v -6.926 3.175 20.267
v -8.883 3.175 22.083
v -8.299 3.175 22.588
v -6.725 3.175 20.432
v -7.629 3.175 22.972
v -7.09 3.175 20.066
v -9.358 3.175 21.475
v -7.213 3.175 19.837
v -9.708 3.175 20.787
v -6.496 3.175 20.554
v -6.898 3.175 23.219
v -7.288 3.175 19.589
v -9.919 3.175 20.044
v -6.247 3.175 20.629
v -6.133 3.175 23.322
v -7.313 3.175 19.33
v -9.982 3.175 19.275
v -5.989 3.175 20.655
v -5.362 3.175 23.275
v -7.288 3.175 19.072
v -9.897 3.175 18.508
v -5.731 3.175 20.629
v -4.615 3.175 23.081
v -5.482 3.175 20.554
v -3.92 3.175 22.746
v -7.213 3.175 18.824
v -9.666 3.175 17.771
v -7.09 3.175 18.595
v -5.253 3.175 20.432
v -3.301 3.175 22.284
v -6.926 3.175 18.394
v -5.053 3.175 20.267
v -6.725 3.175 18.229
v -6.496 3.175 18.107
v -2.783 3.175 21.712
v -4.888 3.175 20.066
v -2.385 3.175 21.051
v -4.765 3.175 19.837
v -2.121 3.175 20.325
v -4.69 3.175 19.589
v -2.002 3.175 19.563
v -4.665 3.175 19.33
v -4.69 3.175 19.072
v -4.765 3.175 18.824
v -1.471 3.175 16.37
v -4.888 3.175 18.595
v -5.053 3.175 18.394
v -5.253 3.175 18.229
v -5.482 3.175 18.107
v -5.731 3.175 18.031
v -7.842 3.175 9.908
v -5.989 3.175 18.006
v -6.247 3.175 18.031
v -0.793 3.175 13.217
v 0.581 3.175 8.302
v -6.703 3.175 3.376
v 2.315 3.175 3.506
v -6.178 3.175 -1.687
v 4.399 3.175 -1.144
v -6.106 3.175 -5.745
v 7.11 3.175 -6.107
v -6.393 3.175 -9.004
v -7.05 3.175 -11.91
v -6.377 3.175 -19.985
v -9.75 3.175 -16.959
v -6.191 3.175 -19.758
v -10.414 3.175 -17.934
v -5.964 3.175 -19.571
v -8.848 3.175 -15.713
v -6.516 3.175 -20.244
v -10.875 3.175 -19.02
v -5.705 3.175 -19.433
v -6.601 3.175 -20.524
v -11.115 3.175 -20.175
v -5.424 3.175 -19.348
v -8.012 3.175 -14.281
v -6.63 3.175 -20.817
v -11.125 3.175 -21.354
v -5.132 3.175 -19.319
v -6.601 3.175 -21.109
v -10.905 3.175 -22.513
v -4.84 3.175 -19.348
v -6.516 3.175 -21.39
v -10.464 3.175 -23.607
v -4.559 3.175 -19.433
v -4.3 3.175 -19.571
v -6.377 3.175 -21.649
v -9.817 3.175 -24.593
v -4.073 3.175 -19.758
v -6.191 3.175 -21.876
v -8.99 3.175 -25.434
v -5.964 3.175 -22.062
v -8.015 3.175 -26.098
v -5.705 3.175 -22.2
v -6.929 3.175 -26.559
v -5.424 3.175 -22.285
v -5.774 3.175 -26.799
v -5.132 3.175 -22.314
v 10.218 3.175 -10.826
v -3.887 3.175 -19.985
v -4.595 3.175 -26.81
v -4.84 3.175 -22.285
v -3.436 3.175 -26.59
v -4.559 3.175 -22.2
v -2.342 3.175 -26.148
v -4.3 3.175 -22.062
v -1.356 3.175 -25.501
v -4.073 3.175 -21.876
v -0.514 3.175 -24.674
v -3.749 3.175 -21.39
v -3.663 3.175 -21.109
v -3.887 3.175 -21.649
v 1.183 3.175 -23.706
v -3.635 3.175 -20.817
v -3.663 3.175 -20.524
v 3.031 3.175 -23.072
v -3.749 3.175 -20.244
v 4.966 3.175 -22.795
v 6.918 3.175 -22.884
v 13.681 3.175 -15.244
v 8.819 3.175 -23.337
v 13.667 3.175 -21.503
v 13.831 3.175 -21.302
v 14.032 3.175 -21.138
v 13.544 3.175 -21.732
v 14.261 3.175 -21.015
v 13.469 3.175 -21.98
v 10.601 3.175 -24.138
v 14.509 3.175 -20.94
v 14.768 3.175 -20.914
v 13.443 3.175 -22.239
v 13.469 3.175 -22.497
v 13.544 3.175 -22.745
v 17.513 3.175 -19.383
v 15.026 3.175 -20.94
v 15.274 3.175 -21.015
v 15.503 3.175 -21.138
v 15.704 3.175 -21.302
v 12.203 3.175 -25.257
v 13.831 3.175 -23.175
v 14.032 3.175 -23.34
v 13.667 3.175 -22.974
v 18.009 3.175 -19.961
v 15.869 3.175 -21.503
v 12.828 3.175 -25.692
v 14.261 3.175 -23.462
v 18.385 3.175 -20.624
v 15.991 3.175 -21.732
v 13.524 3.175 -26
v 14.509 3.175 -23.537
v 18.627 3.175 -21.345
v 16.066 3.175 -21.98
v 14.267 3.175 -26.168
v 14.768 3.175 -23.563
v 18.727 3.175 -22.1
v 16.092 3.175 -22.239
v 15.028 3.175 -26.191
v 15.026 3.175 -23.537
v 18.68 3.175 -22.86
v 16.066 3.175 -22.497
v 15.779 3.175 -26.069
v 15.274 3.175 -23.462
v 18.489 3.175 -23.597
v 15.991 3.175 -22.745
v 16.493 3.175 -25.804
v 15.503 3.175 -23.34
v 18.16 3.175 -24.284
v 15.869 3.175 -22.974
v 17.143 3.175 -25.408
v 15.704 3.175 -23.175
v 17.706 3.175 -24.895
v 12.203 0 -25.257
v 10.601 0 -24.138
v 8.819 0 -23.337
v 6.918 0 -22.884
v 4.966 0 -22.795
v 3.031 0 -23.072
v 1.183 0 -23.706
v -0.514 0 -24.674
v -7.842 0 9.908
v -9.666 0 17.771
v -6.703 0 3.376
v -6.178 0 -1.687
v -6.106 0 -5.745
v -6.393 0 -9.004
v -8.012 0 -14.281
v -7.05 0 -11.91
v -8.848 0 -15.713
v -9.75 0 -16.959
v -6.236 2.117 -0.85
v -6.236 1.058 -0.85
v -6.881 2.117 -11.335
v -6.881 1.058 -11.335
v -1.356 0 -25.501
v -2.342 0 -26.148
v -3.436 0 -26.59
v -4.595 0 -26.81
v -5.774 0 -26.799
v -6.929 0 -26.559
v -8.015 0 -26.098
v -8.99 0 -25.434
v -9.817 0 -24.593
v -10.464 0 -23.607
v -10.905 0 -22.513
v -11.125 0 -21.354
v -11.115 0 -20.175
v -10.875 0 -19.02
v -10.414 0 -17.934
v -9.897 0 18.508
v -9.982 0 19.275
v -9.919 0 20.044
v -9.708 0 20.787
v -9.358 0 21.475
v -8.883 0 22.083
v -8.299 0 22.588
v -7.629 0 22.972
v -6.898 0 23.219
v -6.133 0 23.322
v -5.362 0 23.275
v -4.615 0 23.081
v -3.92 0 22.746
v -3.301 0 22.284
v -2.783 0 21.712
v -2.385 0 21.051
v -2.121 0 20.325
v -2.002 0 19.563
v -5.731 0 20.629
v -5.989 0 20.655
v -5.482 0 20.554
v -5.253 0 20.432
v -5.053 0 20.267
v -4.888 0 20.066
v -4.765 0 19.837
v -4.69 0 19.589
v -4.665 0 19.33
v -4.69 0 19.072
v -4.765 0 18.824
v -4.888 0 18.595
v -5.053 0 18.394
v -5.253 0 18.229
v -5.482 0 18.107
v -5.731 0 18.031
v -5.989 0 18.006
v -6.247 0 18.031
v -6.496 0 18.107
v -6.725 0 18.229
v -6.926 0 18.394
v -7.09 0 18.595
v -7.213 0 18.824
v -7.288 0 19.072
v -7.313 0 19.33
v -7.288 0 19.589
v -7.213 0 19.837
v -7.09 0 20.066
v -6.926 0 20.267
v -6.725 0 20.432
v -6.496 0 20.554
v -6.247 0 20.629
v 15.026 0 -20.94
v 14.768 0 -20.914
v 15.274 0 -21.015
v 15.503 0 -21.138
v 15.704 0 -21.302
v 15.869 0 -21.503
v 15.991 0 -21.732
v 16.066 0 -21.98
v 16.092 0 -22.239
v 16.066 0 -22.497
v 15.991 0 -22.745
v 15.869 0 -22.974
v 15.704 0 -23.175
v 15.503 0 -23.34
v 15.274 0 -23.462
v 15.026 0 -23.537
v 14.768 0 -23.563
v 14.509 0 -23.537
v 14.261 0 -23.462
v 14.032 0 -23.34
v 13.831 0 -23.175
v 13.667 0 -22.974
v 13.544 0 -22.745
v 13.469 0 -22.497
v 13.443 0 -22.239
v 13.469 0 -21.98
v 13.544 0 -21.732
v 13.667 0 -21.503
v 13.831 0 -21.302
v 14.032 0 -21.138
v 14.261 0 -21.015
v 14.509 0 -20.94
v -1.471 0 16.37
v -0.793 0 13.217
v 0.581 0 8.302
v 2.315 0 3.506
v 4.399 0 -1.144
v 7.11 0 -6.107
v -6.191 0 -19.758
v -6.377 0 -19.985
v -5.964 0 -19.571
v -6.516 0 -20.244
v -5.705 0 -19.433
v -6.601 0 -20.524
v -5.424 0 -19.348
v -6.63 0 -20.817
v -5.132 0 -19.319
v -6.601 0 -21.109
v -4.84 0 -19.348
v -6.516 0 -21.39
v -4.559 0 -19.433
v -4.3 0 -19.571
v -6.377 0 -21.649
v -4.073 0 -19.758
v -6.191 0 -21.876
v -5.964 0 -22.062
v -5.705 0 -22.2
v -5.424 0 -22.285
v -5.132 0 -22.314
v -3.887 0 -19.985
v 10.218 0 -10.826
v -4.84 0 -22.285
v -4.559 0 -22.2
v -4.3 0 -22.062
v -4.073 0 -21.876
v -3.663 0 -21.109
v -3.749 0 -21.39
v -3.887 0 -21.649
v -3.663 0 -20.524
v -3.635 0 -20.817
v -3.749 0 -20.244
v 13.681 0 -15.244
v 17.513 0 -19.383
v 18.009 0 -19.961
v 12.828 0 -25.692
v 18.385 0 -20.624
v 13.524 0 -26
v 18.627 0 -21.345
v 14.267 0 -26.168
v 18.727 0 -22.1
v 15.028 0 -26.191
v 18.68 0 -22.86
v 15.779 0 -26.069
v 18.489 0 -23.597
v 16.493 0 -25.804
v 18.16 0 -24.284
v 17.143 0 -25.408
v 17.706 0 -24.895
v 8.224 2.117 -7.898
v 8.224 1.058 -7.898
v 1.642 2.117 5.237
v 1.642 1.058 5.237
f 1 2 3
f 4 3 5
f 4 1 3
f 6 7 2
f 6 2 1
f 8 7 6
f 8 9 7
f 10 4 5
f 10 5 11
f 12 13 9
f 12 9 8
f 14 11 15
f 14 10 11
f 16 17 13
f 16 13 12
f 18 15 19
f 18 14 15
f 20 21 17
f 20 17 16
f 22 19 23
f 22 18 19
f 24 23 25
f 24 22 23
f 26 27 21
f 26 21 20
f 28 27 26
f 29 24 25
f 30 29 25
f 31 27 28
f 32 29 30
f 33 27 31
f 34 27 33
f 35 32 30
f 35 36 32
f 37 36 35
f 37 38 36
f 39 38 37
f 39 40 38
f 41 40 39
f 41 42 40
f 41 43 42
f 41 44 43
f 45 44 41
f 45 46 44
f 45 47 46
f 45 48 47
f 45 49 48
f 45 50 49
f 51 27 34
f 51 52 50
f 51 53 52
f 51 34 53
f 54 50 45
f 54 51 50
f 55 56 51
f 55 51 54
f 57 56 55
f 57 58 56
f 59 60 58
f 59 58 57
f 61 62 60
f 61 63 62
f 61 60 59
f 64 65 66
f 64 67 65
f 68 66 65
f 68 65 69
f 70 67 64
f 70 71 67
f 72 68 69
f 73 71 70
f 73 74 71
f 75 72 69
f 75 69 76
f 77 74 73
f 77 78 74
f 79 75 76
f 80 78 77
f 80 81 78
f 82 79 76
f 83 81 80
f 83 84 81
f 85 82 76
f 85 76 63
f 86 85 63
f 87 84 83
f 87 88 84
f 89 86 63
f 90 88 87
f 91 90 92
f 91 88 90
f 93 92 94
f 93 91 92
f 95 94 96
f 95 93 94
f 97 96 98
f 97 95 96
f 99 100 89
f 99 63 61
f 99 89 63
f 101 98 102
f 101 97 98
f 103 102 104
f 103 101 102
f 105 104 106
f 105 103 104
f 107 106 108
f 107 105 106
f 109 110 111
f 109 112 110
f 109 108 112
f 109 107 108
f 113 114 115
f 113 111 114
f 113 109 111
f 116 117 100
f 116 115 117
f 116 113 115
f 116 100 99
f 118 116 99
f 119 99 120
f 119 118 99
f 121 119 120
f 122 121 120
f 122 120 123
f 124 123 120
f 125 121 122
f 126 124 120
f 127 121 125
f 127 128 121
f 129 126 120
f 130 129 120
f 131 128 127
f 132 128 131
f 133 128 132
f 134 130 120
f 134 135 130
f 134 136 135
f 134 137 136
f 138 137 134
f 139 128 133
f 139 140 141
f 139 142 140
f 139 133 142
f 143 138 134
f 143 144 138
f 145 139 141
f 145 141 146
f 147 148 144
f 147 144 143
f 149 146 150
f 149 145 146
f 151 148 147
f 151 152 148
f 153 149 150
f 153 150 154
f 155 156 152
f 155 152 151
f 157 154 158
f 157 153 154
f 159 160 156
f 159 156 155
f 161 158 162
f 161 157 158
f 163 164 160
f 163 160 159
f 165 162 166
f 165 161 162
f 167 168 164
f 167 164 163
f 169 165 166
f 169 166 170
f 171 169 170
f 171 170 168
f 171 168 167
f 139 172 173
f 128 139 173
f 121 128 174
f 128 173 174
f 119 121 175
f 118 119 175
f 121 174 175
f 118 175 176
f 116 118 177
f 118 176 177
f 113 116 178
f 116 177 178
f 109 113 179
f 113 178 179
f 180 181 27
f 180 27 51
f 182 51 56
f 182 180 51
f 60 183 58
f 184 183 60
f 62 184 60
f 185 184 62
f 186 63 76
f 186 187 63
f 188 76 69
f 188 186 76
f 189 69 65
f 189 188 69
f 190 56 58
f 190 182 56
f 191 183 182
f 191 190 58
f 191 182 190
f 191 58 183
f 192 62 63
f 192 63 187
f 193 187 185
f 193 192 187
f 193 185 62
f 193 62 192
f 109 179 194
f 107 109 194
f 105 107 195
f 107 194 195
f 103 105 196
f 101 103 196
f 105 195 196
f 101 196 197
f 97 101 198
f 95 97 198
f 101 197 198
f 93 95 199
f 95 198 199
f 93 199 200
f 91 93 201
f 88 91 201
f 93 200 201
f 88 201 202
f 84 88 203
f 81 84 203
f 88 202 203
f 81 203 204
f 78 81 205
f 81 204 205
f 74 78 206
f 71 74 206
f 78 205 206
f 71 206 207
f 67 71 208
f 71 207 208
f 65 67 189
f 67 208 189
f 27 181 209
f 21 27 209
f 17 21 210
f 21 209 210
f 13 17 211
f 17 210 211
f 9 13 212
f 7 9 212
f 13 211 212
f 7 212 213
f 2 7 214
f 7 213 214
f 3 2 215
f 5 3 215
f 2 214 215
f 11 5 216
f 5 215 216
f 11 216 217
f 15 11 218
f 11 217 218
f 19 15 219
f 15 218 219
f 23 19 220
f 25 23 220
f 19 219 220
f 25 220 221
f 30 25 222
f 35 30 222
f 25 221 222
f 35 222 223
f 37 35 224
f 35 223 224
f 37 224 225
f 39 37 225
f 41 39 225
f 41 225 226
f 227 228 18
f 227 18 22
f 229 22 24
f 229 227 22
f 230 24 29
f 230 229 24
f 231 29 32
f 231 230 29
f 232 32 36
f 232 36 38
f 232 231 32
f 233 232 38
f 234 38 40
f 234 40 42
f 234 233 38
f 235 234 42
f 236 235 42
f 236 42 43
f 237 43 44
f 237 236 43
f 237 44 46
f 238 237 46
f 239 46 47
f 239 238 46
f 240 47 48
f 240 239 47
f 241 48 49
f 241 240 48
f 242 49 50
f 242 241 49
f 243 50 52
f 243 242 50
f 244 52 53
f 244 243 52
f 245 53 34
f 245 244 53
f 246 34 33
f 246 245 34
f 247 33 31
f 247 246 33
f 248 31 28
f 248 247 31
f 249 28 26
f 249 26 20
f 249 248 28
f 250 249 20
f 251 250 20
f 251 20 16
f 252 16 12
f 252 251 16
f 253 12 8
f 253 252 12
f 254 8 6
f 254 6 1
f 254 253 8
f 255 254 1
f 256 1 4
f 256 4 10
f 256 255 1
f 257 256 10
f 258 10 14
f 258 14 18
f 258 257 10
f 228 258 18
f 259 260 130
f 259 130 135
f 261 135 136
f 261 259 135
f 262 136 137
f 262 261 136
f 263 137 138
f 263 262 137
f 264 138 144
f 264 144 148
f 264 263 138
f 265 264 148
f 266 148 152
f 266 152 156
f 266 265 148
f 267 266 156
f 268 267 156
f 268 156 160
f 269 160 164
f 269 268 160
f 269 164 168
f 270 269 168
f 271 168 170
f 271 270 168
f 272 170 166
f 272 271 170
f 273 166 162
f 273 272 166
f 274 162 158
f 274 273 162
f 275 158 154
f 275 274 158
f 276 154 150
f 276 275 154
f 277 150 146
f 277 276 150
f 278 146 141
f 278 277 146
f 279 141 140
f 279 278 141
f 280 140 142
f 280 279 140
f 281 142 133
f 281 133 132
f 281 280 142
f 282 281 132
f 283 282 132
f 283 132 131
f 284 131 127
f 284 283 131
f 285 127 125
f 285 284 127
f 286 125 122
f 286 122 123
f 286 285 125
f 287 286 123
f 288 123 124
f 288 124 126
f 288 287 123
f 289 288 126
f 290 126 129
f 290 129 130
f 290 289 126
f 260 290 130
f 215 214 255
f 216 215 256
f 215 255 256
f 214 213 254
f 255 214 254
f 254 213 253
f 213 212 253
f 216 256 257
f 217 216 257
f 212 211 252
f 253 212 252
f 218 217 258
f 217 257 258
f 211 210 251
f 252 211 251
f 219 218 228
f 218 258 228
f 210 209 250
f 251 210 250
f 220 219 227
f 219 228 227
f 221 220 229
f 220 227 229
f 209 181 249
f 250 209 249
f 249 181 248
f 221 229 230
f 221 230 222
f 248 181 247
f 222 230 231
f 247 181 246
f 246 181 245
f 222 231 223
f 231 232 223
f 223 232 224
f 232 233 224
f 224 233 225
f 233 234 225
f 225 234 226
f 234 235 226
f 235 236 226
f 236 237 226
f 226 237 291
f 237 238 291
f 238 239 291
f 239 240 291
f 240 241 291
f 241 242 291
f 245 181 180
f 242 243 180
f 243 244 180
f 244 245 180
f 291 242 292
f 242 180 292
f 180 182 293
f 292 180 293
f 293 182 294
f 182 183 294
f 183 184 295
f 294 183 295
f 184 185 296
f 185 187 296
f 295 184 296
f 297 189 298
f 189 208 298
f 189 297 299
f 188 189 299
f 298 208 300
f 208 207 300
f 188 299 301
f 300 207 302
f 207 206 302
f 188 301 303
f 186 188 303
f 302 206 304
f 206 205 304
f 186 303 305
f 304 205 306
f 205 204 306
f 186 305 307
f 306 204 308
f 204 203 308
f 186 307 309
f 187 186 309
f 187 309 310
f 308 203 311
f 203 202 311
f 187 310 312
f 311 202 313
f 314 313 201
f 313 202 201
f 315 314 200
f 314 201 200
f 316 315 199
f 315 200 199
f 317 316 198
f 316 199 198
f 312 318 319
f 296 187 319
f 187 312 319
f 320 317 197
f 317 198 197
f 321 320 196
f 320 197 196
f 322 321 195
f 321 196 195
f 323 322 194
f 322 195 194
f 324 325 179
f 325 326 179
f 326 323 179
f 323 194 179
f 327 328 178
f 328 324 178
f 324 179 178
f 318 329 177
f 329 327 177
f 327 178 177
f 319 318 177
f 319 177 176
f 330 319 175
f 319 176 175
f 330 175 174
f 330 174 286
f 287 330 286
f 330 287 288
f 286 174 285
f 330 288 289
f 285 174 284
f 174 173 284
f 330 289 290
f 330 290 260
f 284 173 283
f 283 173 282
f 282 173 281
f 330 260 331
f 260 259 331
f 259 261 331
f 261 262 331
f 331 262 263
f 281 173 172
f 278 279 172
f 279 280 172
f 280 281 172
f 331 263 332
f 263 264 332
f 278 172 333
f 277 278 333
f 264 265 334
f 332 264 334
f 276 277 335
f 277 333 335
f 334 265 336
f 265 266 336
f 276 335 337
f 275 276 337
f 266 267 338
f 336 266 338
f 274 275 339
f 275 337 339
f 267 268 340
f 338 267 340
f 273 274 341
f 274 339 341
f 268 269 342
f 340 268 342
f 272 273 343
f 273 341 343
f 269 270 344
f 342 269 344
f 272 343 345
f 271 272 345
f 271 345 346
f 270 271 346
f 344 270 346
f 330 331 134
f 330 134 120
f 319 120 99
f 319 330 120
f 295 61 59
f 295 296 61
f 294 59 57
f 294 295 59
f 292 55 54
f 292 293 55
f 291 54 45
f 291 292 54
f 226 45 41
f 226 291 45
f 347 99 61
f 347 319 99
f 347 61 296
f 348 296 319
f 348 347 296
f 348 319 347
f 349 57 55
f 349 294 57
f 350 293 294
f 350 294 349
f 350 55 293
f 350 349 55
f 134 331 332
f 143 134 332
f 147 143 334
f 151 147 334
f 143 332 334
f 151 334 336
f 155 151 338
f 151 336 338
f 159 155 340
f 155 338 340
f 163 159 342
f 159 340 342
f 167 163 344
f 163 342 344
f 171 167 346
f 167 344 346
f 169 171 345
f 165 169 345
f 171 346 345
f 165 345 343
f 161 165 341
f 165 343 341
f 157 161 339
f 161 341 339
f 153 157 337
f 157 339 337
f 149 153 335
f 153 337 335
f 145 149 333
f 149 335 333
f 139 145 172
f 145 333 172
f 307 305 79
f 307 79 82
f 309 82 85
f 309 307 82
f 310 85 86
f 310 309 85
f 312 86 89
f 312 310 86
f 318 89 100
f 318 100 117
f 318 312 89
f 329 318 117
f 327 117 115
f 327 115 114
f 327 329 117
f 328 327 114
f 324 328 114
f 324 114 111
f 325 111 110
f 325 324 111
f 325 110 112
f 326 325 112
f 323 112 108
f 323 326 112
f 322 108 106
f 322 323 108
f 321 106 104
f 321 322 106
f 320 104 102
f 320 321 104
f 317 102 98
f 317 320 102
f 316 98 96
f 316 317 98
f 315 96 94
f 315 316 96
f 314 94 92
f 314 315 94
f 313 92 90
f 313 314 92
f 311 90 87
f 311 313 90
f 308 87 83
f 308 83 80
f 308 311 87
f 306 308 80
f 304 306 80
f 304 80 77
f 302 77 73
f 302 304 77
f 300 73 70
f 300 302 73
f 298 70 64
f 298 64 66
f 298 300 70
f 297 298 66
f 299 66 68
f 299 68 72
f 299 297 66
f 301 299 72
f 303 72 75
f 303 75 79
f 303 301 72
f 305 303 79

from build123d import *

# Parameters (mm, degrees)
SKETCH1_R           = 1.324438001
SKETCH1_R_2         = 1.324206598
SKETCH1_R_3         = 1.497599193
BOSS_EXTRUDE1_DEPTH = 3.175


with BuildPart() as part:
    # Sketch1 → Boss-Extrude1 (new body)
    with BuildSketch(Plane(origin=(0, 0, 0), x_dir=(1, 0, 0), z_dir=(0, 1, 0))):
        with BuildLine():
            ThreePointArc((-9.665902261, -17.771312034), (-6.897981116, -23.219424369), (-2.001997786, -19.562559221))
            add(Edge.make_bspline(
                [(17.513490591, 19.383376385), (6.94674585, 8.875130126), (0.096552729, -4.795463741), (-2.001997786, -19.562559221)],
                knots=[13, 13, 13, 13, 14, 14, 14, 14], degree=3))
            ThreePointArc((17.513490591, 19.383376385), (17.70603035, 24.895348878), (12.202596033, 25.257458036))
            ThreePointArc((12.202596033, 25.257458036), (5.943668971, 22.793339165), (-0.51448442, 24.674377327))
            ThreePointArc((-0.51448442, 24.674377327), (-8.990035225, 25.434433607), (-9.750091506, 16.958882802))
            add(Edge.make_bspline(
                [(-9.665902261, -17.771312034), (-3.58318049, 6.010156861), (-6.384705359, 12.673352049), (-9.750091506, 16.958882802)],
                knots=[4, 4, 4, 4, 5, 5, 5, 5], degree=3))
        make_face()
        with Locations(Location((-5.989030334, -19.330451358, 0), (0, 0, 270))):
            Circle(SKETCH1_R, mode=Mode.SUBTRACT)
        with Locations(Location((14.767597212, 22.238642776, 0), (0, 0, 270))):
            Circle(SKETCH1_R_2, mode=Mode.SUBTRACT)
        with Locations(Location((-5.132287963, 20.816630064, 0), (0, 0, 270))):
            Circle(SKETCH1_R_3, mode=Mode.SUBTRACT)
    extrude(amount=BOSS_EXTRUDE1_DEPTH)


solid = part.part
